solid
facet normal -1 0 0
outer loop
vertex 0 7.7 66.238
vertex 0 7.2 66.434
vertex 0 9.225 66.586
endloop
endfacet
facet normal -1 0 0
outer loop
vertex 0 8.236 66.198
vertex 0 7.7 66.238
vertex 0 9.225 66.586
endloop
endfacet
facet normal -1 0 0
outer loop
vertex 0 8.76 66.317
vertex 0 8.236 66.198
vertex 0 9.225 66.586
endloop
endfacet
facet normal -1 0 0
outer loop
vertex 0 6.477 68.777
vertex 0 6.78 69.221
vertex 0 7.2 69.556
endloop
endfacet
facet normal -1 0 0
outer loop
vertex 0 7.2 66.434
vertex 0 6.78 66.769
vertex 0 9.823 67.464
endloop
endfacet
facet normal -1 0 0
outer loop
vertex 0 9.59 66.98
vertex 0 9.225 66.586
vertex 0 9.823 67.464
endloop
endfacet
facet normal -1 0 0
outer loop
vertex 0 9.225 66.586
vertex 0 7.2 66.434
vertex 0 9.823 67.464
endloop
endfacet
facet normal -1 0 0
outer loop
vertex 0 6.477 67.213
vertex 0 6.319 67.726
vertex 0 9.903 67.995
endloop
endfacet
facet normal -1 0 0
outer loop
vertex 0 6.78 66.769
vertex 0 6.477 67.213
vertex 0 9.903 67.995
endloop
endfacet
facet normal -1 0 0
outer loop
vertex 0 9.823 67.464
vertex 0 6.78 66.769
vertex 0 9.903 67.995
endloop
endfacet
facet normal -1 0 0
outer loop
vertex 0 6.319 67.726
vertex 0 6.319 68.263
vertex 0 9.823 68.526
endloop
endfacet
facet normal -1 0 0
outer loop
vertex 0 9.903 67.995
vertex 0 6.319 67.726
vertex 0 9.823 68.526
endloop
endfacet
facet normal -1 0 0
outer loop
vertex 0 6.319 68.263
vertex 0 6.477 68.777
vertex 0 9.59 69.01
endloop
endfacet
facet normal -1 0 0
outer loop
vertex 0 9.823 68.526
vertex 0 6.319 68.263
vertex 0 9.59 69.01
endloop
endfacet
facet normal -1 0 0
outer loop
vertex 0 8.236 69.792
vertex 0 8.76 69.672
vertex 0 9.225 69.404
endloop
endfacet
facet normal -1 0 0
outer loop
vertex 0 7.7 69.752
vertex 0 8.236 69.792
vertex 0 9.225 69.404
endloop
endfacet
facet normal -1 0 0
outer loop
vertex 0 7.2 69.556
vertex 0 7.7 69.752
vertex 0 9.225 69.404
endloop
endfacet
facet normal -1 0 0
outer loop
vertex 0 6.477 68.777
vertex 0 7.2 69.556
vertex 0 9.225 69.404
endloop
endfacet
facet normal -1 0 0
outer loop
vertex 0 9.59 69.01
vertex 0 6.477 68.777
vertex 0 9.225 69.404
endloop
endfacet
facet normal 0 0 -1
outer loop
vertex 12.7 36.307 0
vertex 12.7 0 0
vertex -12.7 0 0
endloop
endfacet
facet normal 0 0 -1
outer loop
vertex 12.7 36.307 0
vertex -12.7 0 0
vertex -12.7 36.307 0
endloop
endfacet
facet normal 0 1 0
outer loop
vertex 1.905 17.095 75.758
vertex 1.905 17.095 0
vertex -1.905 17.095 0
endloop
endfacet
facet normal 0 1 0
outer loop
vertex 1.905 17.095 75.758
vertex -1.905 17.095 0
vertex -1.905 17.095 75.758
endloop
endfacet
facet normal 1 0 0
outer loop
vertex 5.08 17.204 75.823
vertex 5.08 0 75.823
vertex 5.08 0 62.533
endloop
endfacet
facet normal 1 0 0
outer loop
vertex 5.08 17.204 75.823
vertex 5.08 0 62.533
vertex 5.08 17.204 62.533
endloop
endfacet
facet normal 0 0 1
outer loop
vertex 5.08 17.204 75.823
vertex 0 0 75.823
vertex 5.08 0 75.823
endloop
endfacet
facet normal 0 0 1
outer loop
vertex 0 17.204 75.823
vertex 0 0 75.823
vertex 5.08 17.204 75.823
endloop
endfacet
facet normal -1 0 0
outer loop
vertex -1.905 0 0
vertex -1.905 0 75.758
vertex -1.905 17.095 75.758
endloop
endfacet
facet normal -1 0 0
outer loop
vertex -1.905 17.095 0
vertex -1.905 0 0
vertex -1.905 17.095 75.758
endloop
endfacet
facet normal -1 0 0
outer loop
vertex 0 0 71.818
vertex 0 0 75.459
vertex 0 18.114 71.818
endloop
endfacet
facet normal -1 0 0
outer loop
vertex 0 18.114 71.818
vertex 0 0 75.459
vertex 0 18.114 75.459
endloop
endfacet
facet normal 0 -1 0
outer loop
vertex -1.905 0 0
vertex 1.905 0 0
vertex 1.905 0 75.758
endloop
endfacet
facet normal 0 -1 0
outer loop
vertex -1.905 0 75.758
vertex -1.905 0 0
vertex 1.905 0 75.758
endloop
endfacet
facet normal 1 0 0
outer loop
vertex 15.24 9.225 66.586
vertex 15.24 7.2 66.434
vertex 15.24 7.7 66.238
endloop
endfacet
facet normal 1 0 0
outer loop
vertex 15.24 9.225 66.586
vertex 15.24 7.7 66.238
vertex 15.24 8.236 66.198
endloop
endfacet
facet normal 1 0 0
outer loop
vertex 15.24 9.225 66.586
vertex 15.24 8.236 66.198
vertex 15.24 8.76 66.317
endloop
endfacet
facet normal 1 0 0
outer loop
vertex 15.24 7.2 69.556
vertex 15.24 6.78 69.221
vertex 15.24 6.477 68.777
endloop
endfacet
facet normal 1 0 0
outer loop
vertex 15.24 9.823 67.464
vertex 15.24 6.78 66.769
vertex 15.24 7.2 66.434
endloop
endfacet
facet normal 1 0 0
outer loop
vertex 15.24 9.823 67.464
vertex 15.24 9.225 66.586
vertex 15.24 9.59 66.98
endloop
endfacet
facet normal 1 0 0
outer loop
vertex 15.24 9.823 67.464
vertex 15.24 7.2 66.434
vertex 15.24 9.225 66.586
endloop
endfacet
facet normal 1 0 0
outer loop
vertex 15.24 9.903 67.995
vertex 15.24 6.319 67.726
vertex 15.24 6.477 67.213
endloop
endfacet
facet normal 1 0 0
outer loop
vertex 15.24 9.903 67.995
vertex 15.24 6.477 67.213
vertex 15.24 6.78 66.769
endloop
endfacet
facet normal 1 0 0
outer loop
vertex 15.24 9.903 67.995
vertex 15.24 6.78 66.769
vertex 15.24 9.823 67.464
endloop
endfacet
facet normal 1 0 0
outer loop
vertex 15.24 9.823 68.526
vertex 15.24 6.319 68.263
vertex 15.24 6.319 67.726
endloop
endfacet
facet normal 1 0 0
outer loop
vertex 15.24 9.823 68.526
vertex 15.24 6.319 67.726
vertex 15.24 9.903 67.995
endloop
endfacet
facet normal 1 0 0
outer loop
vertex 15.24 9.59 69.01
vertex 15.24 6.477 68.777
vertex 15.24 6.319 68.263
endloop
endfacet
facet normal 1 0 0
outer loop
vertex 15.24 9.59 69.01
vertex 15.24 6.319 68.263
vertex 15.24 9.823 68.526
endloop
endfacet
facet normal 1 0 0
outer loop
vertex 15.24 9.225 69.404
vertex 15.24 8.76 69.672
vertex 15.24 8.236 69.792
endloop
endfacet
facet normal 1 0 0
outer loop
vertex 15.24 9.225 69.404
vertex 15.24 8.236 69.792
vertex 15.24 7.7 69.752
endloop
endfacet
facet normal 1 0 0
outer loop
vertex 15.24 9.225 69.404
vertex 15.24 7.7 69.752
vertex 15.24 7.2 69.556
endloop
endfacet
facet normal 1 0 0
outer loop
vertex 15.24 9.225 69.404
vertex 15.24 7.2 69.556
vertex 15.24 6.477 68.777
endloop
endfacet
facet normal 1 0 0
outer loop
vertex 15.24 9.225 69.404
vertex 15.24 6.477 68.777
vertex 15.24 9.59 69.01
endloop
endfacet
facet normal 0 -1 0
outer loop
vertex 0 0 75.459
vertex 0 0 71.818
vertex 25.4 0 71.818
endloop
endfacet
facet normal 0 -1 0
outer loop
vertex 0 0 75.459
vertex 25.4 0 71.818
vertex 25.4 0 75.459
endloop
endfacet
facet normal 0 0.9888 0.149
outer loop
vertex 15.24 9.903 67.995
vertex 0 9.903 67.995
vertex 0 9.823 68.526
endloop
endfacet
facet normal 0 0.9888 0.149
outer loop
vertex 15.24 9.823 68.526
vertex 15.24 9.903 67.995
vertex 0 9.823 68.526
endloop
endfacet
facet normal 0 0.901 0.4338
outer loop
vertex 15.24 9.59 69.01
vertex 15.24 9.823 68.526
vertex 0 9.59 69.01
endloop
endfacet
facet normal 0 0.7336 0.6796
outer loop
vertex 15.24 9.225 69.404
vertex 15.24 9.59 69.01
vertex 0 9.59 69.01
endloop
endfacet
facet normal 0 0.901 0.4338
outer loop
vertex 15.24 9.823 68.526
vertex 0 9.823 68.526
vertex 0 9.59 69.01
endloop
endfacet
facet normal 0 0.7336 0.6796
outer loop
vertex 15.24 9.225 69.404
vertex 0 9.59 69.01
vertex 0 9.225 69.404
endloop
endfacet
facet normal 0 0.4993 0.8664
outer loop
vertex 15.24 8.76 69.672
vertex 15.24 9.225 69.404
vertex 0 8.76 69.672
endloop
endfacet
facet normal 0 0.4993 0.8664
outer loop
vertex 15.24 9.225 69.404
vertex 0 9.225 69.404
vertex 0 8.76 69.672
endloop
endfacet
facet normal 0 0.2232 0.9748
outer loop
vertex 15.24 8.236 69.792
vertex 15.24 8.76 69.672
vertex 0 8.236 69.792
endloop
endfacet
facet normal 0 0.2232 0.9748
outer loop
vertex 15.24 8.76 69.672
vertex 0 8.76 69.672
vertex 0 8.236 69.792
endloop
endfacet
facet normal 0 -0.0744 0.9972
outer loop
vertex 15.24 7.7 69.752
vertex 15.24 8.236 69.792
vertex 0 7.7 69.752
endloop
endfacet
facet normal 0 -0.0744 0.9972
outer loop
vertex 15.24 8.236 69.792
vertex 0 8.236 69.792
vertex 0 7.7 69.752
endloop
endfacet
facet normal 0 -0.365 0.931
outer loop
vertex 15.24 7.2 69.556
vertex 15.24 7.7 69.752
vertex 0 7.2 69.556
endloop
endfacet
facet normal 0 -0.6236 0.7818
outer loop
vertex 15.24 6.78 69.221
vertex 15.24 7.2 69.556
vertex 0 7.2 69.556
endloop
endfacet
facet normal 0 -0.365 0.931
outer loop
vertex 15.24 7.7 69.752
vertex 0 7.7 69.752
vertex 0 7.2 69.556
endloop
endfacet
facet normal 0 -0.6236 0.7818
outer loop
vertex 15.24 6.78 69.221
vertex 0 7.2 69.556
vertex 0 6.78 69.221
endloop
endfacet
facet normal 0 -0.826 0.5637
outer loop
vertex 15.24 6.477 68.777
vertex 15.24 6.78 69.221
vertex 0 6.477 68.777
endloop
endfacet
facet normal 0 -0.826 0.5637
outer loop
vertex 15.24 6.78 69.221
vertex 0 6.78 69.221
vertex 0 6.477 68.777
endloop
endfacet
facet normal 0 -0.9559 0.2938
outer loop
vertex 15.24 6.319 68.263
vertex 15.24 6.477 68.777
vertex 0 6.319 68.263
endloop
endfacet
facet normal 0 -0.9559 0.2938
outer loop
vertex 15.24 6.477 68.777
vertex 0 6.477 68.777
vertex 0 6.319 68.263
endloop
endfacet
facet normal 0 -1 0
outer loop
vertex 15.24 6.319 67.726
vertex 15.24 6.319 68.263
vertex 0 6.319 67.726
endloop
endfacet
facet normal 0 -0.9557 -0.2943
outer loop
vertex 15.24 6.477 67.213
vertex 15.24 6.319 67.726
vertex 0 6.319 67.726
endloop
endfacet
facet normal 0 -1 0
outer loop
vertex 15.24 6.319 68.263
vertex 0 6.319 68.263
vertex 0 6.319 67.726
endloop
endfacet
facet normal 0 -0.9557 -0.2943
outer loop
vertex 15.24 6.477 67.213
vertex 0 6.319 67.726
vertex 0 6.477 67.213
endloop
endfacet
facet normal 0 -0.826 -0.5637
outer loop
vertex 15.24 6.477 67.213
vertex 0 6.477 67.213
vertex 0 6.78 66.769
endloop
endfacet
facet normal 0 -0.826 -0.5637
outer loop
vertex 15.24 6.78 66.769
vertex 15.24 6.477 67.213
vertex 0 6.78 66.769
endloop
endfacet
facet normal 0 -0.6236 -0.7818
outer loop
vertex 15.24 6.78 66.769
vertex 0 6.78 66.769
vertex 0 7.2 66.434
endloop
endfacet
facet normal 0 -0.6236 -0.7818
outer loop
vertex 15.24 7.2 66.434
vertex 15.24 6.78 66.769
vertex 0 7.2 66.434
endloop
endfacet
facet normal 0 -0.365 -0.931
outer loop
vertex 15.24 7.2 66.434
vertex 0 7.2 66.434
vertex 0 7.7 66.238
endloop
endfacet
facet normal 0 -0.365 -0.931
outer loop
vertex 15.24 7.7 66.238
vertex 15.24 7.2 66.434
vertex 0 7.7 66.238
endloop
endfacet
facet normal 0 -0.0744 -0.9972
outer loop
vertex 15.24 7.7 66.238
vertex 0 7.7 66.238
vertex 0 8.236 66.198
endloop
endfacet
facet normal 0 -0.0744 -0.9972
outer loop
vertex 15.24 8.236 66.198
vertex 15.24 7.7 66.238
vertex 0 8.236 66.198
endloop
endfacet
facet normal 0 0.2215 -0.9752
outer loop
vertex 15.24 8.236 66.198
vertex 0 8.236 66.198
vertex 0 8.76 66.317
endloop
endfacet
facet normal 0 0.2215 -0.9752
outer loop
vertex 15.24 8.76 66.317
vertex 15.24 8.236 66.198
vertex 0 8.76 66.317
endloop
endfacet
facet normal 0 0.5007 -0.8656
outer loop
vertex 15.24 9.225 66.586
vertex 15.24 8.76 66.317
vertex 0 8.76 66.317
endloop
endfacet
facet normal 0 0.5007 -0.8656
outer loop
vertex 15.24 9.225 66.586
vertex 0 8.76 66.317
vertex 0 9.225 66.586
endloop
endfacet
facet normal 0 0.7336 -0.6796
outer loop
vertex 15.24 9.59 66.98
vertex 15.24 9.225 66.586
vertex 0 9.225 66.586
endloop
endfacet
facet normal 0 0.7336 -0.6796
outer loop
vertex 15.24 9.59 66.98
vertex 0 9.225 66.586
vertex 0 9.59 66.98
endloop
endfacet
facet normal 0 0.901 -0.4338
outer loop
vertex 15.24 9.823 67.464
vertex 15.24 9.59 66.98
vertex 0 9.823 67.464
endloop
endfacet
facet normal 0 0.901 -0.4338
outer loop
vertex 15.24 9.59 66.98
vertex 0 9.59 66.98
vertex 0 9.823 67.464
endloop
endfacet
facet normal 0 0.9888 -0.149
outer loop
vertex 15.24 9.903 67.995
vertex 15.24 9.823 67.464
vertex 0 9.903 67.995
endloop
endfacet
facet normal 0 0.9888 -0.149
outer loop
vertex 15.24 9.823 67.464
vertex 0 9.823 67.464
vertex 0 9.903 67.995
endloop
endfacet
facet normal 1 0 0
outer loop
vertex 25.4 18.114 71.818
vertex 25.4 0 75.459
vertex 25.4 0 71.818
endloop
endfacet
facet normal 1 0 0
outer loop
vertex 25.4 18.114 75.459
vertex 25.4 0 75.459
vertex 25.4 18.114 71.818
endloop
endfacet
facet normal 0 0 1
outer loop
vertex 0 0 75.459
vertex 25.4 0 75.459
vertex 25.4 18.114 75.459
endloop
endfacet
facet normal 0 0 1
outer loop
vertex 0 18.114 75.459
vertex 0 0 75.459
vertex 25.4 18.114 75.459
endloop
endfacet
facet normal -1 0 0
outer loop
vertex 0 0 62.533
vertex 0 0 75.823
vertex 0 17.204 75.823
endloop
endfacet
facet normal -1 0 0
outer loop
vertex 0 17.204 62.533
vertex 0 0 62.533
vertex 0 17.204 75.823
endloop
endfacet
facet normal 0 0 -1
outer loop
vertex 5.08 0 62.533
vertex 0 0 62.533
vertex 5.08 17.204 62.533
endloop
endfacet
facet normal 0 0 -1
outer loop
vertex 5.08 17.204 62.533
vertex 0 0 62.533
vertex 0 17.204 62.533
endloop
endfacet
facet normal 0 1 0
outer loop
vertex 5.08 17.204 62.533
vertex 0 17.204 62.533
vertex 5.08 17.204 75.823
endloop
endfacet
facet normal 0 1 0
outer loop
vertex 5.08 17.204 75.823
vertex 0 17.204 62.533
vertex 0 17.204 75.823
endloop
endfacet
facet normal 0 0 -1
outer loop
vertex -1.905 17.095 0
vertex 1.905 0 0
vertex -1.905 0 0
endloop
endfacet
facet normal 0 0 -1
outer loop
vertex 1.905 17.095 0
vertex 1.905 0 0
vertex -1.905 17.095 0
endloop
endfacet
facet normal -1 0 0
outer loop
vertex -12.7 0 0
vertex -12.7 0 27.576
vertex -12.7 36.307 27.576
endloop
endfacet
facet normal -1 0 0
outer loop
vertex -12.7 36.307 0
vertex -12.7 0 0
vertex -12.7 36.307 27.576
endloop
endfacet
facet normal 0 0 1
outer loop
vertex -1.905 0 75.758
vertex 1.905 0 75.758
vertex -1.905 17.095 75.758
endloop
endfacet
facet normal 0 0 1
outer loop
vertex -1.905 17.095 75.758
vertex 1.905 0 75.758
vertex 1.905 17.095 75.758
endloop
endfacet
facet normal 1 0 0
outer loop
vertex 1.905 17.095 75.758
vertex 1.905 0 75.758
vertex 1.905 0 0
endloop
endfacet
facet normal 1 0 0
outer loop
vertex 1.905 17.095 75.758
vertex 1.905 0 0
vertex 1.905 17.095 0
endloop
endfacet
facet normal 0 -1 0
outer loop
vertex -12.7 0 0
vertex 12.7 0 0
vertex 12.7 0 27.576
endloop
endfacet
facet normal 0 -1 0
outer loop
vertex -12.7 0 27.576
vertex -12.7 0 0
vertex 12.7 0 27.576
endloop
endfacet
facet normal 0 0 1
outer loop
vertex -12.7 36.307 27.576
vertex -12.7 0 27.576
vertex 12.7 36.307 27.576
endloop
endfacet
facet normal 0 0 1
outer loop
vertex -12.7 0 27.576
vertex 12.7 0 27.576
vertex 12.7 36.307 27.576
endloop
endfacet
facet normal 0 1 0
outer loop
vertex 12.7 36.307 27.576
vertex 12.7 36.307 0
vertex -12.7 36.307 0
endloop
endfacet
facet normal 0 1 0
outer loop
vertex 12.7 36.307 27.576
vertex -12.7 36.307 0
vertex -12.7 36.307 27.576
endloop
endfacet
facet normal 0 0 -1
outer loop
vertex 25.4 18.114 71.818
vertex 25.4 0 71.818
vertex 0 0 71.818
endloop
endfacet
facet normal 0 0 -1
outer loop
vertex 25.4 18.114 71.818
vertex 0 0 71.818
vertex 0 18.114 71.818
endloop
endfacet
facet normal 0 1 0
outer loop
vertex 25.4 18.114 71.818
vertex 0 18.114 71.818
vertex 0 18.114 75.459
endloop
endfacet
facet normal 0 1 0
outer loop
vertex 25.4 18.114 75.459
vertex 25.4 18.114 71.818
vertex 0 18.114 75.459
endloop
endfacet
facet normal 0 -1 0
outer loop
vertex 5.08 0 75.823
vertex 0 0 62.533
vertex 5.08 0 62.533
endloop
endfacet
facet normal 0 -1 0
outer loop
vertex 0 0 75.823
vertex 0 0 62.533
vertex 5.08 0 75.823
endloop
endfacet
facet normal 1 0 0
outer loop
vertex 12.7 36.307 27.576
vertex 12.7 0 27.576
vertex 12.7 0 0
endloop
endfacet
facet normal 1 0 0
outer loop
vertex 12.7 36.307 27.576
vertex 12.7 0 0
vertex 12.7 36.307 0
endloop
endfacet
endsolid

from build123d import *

# Parameters (mm, degrees)
F0_W     = 36.307111
F0_H     = 27.576232
F5_DEPTH = 12.7
F3_W     = 17.203515
F3_H     = 13.289481
F6_DEPTH = 5.08
F1_W     = 17.095277
F1_H     = 75.758271
F7_DEPTH = 1.905
F4_R     = 1.80218
F8_DEPTH = 15.24
F2_W     = 18.113755
F2_H     = 3.640957
F9_DEPTH = 25.4


with BuildPart() as f5:
    # F0 (on Right) → F5 (new body, symmetric)
    with BuildSketch(Plane.YZ):
        with Locations((18.153555, 13.788116)):
            Rectangle(F0_W, F0_H)
    extrude(amount=F5_DEPTH, both=True)


with BuildPart() as f6:
    # F3 (on Right) → F6 (new body)
    with BuildSketch(Plane.YZ):
        with Locations((8.601757, 69.178157)):
            Rectangle(F3_W, F3_H)
    extrude(amount=F6_DEPTH)


with BuildPart() as f7:
    # F1 (on Right) → F7 (new body, symmetric)
    with BuildSketch(Plane.YZ):
        with Locations((8.547638, 37.879135)):
            Rectangle(F1_W, F1_H)
    extrude(amount=F7_DEPTH, both=True)


with BuildPart() as f8:
    # F4 (on Right) → F8 (new body)
    with BuildSketch(Plane.YZ):
        with Locations((8.101127, 67.994848)):
            Circle(F4_R)
    extrude(amount=F8_DEPTH)


with BuildPart() as f9:
    # F2 (on Right) → F9 (new body)
    with BuildSketch(Plane.YZ):
        with Locations((9.056877, 73.638331)):
            Rectangle(F2_W, F2_H)
    extrude(amount=F9_DEPTH)


solid = Compound([f5.part, f6.part, f7.part, f8.part, f9.part])
